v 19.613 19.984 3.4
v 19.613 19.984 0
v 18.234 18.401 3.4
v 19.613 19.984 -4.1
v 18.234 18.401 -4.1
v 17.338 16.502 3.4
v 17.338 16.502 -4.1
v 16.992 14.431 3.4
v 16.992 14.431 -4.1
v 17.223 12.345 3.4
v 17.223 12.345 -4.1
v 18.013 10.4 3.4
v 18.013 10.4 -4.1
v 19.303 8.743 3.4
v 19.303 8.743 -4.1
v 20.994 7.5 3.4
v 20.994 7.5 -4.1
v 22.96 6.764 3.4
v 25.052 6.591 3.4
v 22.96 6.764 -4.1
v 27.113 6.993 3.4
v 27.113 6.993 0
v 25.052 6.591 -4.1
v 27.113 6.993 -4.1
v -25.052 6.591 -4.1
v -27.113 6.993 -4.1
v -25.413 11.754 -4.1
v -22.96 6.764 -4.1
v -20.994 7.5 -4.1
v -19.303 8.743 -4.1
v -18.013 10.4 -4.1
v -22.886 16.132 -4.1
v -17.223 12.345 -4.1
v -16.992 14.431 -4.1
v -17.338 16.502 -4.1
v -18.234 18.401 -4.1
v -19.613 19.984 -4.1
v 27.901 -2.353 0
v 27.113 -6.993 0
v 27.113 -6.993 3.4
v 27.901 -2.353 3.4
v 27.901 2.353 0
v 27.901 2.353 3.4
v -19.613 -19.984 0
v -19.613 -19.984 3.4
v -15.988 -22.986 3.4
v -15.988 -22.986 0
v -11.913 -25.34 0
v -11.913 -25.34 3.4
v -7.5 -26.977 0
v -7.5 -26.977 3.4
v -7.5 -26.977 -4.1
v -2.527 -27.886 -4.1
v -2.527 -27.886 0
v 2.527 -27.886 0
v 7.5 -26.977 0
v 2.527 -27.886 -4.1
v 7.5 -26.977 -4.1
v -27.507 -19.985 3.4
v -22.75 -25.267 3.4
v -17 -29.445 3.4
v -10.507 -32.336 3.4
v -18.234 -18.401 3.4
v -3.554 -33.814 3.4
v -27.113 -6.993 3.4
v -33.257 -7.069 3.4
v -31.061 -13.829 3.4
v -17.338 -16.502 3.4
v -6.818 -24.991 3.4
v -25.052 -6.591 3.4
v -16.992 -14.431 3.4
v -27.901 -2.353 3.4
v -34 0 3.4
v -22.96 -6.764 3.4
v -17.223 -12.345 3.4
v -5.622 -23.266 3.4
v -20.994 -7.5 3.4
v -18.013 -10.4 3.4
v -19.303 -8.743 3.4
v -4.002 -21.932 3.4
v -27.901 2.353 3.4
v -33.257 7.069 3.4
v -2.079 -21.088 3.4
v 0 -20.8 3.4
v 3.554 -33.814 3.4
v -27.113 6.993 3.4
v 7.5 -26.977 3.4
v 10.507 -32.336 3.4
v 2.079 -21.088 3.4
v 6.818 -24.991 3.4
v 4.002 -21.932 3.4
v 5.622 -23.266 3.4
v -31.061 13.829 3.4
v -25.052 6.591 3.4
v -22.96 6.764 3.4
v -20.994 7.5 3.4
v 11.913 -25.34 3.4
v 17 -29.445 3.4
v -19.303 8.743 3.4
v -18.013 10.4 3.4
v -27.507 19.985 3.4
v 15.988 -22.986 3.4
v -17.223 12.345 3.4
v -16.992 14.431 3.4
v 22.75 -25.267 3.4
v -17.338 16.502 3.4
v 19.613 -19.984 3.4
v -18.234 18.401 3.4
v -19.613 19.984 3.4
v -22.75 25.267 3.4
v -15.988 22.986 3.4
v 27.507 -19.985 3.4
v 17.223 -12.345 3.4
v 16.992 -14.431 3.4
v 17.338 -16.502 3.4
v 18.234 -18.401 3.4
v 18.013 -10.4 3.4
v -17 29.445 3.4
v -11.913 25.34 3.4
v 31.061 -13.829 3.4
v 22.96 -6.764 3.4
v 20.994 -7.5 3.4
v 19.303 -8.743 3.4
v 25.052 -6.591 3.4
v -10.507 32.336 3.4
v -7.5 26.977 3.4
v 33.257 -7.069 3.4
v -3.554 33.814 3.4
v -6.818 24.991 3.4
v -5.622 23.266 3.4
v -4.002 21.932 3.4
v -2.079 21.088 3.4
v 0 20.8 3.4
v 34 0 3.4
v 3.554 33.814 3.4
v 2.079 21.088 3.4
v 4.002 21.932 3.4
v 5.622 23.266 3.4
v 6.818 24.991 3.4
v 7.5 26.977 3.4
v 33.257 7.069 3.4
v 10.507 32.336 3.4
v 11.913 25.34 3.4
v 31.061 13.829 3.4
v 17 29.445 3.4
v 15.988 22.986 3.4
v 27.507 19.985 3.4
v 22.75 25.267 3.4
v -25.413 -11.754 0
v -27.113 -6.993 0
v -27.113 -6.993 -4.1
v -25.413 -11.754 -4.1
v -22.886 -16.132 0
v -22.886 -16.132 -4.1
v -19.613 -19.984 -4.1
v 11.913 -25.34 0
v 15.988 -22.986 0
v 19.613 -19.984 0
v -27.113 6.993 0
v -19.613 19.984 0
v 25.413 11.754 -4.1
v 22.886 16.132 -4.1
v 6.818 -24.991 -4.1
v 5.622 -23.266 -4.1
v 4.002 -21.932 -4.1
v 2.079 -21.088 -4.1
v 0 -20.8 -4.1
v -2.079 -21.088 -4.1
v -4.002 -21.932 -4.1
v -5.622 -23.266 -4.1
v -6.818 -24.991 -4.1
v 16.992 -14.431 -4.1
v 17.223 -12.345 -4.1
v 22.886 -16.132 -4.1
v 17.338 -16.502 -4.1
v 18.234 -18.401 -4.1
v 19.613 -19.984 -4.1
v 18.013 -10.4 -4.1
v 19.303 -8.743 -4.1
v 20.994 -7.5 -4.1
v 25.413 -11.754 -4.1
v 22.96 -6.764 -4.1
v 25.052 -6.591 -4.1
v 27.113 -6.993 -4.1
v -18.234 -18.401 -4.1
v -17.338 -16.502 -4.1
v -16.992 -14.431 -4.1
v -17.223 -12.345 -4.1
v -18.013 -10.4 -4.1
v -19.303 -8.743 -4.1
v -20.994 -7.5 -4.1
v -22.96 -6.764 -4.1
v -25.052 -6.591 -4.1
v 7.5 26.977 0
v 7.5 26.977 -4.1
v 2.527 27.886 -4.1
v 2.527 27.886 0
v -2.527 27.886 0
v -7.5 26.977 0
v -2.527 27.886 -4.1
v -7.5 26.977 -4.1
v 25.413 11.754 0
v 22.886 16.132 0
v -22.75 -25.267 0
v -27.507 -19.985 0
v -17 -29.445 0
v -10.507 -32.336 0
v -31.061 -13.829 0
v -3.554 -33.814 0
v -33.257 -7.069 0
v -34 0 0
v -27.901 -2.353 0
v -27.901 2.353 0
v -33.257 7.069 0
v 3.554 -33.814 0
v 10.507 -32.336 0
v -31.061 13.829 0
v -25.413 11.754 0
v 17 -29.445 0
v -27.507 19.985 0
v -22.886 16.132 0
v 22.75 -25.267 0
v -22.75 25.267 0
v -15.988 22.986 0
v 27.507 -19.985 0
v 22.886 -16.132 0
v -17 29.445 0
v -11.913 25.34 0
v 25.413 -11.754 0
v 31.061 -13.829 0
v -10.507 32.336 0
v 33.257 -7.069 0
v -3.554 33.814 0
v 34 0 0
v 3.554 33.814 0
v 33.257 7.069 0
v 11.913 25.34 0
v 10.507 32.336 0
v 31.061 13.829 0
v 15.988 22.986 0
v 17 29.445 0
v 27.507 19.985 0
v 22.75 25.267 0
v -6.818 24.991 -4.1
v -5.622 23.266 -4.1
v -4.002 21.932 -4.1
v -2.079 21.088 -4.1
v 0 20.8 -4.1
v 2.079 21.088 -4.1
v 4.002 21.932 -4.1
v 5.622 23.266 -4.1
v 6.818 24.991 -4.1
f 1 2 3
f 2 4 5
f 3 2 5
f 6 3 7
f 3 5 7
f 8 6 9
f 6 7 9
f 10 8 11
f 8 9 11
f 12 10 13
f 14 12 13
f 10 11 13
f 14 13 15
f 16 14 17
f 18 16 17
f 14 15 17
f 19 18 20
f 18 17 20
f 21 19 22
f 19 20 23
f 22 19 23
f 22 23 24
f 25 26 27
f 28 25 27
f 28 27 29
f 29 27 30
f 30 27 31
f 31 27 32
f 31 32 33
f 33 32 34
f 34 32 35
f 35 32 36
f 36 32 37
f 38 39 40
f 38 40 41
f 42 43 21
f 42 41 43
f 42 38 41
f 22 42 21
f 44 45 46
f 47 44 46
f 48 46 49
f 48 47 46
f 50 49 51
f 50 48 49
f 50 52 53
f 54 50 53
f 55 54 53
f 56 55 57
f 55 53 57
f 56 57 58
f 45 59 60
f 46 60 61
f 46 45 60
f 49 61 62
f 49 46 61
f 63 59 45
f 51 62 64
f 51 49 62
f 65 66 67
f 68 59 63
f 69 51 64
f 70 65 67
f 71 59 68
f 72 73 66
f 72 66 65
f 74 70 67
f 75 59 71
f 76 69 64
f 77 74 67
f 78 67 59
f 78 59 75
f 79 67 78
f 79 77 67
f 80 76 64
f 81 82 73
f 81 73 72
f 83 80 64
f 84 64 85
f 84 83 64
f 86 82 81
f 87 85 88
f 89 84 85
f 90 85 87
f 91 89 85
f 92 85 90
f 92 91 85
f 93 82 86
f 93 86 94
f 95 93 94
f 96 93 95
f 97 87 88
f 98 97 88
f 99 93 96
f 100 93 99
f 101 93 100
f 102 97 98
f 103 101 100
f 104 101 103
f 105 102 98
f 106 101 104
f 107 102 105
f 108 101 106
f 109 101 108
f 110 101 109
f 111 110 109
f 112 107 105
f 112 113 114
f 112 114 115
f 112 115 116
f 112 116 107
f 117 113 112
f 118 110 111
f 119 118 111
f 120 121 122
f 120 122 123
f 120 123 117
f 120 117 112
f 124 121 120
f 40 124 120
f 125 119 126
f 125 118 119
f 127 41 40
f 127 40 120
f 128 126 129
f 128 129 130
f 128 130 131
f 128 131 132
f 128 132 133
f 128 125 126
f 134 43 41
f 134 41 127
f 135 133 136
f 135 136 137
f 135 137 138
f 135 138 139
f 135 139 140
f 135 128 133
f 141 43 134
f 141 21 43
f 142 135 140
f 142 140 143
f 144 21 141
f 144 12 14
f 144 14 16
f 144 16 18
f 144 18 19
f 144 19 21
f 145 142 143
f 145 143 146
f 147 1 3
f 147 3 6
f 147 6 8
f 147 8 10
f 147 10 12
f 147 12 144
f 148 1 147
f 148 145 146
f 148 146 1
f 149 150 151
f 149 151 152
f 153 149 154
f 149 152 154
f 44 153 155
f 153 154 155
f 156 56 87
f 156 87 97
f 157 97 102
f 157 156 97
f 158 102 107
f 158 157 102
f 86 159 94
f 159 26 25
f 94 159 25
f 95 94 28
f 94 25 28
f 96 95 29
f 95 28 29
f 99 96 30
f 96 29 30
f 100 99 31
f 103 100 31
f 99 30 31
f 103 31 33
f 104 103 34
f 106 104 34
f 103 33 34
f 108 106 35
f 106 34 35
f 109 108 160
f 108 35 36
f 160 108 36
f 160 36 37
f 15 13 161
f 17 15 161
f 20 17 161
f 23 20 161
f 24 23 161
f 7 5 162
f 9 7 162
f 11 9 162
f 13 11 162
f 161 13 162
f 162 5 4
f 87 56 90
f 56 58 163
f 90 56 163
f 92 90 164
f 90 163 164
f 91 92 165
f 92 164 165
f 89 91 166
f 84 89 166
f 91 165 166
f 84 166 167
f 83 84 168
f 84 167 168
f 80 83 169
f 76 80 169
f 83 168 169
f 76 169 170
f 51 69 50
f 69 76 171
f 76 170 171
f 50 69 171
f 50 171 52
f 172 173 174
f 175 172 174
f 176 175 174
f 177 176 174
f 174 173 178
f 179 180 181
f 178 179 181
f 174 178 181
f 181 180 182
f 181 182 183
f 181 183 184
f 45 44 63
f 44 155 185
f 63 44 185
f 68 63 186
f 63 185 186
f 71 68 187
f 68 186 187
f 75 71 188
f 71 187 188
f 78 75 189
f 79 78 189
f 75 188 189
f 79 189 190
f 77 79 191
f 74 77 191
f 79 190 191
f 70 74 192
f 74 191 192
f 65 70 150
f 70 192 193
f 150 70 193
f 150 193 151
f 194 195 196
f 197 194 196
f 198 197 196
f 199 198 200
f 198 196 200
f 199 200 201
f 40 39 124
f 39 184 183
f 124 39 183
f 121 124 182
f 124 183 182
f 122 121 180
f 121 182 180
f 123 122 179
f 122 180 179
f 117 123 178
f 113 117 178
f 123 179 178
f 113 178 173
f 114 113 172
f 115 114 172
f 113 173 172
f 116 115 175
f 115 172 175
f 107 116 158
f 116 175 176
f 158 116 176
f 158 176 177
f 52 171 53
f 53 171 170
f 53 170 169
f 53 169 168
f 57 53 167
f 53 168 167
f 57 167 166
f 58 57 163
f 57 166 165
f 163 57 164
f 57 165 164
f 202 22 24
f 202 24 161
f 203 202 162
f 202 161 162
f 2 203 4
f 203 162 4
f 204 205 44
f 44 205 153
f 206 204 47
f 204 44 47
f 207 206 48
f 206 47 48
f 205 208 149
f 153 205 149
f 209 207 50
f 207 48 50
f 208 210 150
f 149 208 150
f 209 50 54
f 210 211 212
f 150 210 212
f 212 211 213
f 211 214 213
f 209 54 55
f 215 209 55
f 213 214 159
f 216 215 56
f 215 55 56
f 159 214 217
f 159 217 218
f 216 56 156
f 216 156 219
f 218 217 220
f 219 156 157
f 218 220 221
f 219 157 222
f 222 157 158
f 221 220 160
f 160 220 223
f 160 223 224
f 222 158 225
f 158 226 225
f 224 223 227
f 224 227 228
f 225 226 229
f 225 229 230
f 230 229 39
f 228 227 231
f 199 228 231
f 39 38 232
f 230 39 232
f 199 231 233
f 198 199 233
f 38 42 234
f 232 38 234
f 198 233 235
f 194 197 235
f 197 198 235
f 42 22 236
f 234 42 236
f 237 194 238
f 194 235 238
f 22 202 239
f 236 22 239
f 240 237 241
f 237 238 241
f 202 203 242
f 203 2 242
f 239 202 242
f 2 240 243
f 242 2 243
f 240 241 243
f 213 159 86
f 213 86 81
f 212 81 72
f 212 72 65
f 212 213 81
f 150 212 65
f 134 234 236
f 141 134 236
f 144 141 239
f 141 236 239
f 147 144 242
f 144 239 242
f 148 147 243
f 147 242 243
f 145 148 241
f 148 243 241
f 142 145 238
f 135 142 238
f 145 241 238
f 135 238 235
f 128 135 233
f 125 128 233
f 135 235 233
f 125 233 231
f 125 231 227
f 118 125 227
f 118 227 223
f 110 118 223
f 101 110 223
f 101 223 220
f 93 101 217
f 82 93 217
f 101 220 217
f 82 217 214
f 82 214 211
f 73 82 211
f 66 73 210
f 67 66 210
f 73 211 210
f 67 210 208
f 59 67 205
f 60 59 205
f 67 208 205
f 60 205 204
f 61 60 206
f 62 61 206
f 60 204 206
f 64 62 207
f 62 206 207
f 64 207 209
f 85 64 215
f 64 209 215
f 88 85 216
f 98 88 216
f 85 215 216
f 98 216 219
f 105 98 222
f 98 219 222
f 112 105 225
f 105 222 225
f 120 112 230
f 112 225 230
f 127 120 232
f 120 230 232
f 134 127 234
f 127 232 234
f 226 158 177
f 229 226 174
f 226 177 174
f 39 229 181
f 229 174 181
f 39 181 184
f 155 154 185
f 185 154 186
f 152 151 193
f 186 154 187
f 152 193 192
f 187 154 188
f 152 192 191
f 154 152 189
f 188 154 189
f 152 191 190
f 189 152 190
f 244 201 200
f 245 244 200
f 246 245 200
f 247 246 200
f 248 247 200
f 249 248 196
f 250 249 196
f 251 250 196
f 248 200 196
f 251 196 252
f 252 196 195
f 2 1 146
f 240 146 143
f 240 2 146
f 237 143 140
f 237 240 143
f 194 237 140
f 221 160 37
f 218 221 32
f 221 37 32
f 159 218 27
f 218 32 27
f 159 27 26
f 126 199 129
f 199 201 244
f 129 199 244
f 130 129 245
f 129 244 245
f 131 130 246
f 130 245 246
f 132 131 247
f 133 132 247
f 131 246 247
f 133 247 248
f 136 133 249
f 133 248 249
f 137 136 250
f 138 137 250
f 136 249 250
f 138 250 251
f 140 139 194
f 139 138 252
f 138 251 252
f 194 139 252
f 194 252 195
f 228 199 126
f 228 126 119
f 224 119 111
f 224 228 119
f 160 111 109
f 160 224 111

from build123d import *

# Parameters (mm, degrees)
SKETCH_1_R      = 34
SKETCH_1_R_2    = 28
EXTRUDE_1_DEPTH = 3.4
EXTRUDE_START   = -7.5
EXTRUDE_2_DEPTH = 7.5


with BuildPart() as part:
    # Эскиз1 → Бобышка-Вытянуть1 (new body)
    with BuildSketch(Plane.XY):
        Circle(SKETCH_1_R)
        Circle(SKETCH_1_R_2, mode=Mode.SUBTRACT)
    extrude(amount=EXTRUDE_1_DEPTH)

    # Эскиз2 → Бобышка-Вытянуть2 (add)
    with BuildSketch(Plane.XY.offset(3.4).offset(EXTRUDE_START)):
        with BuildLine():
            ThreePointArc((-7.5, 26.97684192), (0, 20.8), (7.5, 26.97684192))
            ThreePointArc((7.5, 26.97684192), (0, 28), (-7.5, 26.97684192))
        make_face()
        with BuildLine():
            ThreePointArc((19.612630417, 19.983611489), (18.013328399, 10.4), (27.112630417, 6.993230432))
            ThreePointArc((27.112630417, 6.993230432), (24.248711306, 14), (19.612630417, 19.983611489))
        make_face()
        with BuildLine():
            ThreePointArc((27.112630417, -6.993230432), (18.013328399, -10.4), (19.612630417, -19.983611489))
            ThreePointArc((19.612630417, -19.983611489), (24.248711306, -14), (27.112630417, -6.993230432))
        make_face()
        with BuildLine():
            ThreePointArc((7.5, -26.97684192), (0, -20.8), (-7.5, -26.97684192))
            ThreePointArc((-7.5, -26.97684192), (0, -28), (7.5, -26.97684192))
        make_face()
        with BuildLine():
            ThreePointArc((-19.612630417, -19.983611489), (-18.013328399, -10.4), (-27.112630417, -6.993230432))
            ThreePointArc((-27.112630417, -6.993230432), (-24.248711306, -14), (-19.612630417, -19.983611489))
        make_face()
        with BuildLine():
            ThreePointArc((-27.112630417, 6.993230432), (-18.013328399, 10.4), (-19.612630417, 19.983611489))
            ThreePointArc((-19.612630417, 19.983611489), (-24.248711306, 14), (-27.112630417, 6.993230432))
        make_face()
    extrude(amount=EXTRUDE_2_DEPTH)


solid = part.part
